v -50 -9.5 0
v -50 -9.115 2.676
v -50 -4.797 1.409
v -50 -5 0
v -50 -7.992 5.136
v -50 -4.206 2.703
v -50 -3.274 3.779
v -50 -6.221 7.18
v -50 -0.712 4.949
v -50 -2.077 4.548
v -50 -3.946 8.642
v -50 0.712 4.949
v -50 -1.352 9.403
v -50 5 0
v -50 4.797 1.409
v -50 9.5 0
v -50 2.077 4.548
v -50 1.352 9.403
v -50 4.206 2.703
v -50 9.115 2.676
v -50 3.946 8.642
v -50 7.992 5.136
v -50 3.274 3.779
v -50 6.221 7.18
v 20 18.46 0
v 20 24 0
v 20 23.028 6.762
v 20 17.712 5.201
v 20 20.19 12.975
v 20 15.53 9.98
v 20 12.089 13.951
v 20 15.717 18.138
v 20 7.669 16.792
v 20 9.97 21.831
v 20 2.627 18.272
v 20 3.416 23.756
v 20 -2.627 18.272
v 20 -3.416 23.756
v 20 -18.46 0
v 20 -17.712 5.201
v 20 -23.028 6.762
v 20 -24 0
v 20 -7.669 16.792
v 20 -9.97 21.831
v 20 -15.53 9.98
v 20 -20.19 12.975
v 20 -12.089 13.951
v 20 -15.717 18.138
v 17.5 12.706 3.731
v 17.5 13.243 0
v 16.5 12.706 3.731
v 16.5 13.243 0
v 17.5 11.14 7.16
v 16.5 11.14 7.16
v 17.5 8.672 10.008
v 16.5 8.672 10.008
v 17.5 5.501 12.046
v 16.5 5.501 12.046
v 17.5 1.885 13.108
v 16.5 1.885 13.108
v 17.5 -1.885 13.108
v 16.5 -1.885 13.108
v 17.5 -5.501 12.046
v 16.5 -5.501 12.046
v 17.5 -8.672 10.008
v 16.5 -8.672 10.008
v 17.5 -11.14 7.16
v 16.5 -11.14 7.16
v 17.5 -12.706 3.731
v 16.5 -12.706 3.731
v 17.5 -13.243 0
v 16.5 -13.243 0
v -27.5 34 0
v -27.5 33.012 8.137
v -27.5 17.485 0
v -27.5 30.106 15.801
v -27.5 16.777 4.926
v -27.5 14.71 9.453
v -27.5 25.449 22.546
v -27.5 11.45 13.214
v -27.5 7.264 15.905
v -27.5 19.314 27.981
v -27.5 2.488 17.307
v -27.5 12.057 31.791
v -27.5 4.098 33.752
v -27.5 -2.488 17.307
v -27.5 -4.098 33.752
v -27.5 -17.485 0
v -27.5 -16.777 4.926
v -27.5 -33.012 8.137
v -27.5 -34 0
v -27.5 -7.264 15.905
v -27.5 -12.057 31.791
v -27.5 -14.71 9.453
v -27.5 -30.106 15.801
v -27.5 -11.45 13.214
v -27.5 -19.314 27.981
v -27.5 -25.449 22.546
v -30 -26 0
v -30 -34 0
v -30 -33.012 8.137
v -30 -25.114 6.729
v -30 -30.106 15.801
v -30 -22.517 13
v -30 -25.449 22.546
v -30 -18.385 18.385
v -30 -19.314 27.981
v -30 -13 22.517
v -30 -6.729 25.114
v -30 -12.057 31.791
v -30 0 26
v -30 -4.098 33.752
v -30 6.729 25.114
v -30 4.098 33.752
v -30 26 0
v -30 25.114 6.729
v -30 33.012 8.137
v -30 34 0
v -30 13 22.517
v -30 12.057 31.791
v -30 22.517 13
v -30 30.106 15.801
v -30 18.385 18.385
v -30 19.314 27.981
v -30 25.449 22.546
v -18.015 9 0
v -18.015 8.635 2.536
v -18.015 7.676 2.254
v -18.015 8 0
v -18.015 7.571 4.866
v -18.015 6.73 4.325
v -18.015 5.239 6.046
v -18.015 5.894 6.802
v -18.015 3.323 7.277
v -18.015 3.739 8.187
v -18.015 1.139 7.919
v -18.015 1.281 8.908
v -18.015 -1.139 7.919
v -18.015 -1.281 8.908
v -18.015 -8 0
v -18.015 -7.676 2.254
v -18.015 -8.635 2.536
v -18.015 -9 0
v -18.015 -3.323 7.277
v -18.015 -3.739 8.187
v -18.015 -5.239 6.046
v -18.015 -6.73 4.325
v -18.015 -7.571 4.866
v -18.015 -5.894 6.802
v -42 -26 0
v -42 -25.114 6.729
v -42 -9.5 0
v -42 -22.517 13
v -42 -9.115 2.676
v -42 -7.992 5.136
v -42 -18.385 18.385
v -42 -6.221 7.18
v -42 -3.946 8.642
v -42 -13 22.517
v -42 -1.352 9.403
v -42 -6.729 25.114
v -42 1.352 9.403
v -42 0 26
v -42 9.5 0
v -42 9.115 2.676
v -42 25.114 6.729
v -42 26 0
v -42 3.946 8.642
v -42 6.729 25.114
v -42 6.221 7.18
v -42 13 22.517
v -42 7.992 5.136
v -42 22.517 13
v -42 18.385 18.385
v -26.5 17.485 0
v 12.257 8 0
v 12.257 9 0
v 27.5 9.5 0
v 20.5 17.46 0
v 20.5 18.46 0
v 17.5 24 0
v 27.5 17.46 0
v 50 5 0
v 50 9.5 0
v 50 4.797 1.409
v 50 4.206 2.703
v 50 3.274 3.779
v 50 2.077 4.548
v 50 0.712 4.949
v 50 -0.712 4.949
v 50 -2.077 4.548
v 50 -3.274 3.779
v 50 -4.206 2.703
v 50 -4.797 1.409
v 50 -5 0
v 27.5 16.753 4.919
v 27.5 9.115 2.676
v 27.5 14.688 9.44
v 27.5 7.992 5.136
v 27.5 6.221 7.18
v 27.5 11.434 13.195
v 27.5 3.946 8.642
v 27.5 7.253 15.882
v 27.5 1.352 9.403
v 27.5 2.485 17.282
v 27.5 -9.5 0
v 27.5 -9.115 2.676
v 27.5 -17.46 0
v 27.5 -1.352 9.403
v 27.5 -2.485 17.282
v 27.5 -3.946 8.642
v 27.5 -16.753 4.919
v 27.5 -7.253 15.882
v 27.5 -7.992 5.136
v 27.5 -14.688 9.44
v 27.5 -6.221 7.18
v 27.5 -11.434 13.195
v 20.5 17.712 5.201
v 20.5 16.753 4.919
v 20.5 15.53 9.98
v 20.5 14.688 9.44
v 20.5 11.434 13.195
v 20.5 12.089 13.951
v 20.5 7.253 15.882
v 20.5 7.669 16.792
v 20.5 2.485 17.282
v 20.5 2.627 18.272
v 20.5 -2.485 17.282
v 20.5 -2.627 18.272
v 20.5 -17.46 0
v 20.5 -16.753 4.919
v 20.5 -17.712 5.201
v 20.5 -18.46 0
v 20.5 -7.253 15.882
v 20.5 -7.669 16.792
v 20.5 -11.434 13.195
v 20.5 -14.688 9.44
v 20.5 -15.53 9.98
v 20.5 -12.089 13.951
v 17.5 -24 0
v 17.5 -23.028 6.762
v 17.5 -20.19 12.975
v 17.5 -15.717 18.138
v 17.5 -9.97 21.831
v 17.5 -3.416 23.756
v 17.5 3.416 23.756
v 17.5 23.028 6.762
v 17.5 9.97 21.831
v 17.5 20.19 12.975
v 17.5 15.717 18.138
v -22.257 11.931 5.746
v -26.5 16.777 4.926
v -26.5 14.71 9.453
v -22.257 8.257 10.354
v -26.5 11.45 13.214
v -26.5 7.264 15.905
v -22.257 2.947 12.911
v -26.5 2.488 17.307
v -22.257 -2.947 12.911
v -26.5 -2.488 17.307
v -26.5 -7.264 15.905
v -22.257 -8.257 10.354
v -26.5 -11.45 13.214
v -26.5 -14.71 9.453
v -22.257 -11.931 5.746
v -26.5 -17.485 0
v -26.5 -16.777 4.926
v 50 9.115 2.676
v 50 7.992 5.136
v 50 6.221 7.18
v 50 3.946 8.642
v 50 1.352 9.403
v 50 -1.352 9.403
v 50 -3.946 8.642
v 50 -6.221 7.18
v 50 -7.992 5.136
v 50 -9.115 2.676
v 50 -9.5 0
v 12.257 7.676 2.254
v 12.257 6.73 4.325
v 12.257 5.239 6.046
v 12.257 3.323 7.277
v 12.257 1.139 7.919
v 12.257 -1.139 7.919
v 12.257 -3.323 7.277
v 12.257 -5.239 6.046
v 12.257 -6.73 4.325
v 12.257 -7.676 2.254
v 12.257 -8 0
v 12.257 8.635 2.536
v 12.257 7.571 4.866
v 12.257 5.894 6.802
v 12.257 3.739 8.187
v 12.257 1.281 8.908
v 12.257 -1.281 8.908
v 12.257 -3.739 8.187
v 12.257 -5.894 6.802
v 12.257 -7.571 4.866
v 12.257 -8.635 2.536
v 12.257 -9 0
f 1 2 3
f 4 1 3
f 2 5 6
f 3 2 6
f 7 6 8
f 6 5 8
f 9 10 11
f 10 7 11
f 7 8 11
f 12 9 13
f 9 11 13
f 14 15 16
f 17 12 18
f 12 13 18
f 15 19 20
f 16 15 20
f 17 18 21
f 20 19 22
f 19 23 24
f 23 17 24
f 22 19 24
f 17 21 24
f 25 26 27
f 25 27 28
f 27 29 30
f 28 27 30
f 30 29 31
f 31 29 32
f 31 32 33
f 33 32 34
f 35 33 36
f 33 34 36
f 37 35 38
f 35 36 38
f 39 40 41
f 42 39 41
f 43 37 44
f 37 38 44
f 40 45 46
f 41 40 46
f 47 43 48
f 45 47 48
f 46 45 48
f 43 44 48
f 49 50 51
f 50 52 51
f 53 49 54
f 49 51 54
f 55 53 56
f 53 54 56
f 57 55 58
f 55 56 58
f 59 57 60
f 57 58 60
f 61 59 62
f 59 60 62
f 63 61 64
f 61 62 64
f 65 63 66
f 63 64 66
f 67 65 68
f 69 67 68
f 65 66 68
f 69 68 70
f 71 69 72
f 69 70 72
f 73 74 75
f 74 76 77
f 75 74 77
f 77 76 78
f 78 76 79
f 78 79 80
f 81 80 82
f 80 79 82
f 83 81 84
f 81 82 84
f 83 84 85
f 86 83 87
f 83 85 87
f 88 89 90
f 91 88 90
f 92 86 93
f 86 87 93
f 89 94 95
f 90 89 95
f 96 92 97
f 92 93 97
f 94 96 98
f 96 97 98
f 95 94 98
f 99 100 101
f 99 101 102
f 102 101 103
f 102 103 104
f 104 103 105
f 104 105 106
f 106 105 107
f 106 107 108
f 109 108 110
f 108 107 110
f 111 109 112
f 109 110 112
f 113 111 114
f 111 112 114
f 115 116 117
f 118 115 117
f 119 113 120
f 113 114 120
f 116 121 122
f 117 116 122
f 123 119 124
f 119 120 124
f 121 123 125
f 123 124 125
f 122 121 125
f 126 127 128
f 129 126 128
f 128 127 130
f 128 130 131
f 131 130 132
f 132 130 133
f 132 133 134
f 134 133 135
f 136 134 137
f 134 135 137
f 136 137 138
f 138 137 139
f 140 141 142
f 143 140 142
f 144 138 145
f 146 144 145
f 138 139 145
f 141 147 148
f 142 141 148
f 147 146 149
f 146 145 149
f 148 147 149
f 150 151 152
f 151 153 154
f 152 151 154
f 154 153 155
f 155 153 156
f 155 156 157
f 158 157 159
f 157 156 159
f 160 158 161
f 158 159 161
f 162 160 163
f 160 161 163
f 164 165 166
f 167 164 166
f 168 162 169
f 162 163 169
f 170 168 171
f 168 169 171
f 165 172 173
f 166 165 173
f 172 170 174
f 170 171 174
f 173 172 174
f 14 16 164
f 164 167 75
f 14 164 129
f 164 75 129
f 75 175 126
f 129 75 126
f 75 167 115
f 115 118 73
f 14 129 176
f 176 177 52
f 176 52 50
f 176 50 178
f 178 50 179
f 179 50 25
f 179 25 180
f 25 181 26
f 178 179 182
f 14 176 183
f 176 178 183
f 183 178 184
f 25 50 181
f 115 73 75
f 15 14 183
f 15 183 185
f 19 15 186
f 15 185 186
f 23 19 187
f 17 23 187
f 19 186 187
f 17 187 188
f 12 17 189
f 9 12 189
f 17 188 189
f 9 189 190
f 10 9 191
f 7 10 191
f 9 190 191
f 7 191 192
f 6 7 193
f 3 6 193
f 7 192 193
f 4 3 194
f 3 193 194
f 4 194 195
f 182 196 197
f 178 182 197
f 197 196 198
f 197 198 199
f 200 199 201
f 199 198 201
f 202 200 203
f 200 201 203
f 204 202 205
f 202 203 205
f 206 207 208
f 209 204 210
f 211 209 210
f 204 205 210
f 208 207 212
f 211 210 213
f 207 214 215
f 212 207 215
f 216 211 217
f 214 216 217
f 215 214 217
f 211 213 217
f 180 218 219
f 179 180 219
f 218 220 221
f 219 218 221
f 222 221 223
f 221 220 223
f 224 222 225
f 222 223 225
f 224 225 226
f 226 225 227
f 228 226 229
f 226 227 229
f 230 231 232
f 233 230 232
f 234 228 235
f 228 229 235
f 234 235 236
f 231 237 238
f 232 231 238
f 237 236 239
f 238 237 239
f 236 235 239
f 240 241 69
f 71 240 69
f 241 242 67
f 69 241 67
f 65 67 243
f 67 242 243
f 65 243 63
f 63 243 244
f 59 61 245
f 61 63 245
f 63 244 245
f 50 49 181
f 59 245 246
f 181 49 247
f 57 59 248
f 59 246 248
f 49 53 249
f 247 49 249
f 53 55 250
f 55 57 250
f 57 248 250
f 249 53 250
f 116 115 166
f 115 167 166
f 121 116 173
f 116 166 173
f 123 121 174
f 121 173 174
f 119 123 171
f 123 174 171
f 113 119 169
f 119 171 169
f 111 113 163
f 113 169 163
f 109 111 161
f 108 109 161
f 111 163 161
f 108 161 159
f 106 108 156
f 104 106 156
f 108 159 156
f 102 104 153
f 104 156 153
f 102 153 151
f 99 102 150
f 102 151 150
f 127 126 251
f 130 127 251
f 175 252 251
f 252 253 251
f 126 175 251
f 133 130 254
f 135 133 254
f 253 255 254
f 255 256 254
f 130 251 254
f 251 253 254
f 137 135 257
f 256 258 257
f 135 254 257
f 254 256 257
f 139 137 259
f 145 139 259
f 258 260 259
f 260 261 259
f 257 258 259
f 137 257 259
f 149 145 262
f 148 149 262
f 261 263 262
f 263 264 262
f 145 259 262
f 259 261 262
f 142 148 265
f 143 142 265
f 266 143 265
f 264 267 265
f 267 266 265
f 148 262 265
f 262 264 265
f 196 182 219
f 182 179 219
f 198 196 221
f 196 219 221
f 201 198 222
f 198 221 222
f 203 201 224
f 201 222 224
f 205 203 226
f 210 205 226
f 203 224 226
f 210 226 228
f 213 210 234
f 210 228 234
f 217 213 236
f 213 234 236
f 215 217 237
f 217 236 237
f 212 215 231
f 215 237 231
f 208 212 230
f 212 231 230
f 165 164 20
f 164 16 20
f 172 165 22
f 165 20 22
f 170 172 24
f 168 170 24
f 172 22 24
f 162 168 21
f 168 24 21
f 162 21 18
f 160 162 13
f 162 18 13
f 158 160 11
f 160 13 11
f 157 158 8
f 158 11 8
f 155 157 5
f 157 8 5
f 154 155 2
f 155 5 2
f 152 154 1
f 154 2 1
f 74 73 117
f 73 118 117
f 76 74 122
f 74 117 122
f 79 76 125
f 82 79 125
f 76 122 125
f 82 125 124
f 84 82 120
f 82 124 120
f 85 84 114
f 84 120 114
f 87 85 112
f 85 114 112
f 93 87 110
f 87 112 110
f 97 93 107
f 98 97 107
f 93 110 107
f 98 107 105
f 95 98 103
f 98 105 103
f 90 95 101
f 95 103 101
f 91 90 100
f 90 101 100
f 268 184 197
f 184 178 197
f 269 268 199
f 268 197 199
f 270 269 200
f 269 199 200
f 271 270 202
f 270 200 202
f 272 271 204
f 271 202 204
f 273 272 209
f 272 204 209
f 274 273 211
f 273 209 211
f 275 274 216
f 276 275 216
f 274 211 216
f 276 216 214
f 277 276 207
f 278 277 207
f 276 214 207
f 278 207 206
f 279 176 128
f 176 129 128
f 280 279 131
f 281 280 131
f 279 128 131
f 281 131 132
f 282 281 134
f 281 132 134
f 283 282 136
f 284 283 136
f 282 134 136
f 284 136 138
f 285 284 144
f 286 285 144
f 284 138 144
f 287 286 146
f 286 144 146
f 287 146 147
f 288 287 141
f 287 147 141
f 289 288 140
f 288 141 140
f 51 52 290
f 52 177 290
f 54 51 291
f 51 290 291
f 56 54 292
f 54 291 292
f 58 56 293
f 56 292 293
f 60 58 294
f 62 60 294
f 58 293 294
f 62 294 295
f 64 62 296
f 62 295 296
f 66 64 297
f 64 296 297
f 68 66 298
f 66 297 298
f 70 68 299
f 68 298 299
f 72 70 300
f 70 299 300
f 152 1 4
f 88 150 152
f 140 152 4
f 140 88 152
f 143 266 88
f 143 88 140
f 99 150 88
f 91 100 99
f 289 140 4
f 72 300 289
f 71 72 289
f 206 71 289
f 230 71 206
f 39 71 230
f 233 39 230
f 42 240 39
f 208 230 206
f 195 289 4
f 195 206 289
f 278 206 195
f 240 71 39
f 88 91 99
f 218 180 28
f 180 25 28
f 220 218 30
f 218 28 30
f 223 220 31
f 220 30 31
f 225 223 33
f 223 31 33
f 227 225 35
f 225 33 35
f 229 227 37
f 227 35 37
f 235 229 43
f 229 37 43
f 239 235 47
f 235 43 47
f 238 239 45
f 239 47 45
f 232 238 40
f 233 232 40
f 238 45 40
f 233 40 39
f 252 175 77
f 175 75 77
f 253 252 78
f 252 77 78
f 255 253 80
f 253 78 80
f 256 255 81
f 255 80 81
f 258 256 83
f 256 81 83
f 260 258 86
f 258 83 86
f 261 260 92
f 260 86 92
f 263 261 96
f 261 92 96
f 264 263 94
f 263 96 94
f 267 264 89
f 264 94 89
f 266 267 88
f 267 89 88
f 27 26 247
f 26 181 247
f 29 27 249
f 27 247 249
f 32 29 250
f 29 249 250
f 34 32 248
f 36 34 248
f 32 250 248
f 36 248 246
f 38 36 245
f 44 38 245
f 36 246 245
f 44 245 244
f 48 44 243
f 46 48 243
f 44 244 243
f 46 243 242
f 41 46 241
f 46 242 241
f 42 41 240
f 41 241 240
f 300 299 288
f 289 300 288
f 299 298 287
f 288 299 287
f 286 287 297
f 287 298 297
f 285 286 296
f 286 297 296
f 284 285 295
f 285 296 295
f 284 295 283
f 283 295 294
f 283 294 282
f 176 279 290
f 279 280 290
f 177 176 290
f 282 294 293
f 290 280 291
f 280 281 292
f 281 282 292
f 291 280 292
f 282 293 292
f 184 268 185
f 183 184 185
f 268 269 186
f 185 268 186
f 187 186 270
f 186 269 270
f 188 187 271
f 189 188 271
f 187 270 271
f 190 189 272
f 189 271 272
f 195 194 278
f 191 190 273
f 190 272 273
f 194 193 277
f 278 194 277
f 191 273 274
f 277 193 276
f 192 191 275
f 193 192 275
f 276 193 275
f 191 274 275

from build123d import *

# Parameters (mm, degrees)
REVOLUTION_ANGLE   = 180
SKETCH001_R        = 2.5
POCKET_DEPTH       = 22
POLARPATTERN_COUNT = 12


with BuildPart() as part:
    # Sketch → Revolution (revolve)
    with BuildSketch(Plane.XY):
        Polygon((27.5, 9.5), (27.5, 17.46), (20.5, 17.46), (20.5, 18.46), (20, 18.46), (20, 24), (17.5, 24), (17.5, 13.242641), (16.5, 13.242641), (12.257359, 9), (12.257359, 8), (-18.014719, 8), (-18.014719, 9), (-26.5, 17.485281), (-27.5, 17.485281), (-27.5, 34), (-30, 34), (-30, 26), (-42, 26), (-42, 9.5), (-50, 9.5), (-50, 5), (50, 5), (50, 9.5), align=None)
    revolve(axis=Axis((0, 0, 0), (1, 0, 0)), revolution_arc=REVOLUTION_ANGLE)

    # Sketch001 → Pocket (cut)
    with BuildSketch(Plane(origin=(-74.5, 0, 0), x_dir=(0, -1, 0), z_dir=(-1, 0, 0))):
        with Locations((0, 22)):
            Circle(SKETCH001_R)
        with Locations((0, 15)):
            Circle(SKETCH001_R)
    pocket = extrude(amount=-POCKET_DEPTH, mode=Mode.SUBTRACT)

    # PolarPattern: Pocket ×12 about axis
    polarpattern_axis = Axis((-74.5, 0, 0), (-1, 0, 0))
    for i in range(1, POLARPATTERN_COUNT):
        add(pocket.rotate(polarpattern_axis, i * 360 / POLARPATTERN_COUNT), mode=Mode.SUBTRACT)


solid = part.part
